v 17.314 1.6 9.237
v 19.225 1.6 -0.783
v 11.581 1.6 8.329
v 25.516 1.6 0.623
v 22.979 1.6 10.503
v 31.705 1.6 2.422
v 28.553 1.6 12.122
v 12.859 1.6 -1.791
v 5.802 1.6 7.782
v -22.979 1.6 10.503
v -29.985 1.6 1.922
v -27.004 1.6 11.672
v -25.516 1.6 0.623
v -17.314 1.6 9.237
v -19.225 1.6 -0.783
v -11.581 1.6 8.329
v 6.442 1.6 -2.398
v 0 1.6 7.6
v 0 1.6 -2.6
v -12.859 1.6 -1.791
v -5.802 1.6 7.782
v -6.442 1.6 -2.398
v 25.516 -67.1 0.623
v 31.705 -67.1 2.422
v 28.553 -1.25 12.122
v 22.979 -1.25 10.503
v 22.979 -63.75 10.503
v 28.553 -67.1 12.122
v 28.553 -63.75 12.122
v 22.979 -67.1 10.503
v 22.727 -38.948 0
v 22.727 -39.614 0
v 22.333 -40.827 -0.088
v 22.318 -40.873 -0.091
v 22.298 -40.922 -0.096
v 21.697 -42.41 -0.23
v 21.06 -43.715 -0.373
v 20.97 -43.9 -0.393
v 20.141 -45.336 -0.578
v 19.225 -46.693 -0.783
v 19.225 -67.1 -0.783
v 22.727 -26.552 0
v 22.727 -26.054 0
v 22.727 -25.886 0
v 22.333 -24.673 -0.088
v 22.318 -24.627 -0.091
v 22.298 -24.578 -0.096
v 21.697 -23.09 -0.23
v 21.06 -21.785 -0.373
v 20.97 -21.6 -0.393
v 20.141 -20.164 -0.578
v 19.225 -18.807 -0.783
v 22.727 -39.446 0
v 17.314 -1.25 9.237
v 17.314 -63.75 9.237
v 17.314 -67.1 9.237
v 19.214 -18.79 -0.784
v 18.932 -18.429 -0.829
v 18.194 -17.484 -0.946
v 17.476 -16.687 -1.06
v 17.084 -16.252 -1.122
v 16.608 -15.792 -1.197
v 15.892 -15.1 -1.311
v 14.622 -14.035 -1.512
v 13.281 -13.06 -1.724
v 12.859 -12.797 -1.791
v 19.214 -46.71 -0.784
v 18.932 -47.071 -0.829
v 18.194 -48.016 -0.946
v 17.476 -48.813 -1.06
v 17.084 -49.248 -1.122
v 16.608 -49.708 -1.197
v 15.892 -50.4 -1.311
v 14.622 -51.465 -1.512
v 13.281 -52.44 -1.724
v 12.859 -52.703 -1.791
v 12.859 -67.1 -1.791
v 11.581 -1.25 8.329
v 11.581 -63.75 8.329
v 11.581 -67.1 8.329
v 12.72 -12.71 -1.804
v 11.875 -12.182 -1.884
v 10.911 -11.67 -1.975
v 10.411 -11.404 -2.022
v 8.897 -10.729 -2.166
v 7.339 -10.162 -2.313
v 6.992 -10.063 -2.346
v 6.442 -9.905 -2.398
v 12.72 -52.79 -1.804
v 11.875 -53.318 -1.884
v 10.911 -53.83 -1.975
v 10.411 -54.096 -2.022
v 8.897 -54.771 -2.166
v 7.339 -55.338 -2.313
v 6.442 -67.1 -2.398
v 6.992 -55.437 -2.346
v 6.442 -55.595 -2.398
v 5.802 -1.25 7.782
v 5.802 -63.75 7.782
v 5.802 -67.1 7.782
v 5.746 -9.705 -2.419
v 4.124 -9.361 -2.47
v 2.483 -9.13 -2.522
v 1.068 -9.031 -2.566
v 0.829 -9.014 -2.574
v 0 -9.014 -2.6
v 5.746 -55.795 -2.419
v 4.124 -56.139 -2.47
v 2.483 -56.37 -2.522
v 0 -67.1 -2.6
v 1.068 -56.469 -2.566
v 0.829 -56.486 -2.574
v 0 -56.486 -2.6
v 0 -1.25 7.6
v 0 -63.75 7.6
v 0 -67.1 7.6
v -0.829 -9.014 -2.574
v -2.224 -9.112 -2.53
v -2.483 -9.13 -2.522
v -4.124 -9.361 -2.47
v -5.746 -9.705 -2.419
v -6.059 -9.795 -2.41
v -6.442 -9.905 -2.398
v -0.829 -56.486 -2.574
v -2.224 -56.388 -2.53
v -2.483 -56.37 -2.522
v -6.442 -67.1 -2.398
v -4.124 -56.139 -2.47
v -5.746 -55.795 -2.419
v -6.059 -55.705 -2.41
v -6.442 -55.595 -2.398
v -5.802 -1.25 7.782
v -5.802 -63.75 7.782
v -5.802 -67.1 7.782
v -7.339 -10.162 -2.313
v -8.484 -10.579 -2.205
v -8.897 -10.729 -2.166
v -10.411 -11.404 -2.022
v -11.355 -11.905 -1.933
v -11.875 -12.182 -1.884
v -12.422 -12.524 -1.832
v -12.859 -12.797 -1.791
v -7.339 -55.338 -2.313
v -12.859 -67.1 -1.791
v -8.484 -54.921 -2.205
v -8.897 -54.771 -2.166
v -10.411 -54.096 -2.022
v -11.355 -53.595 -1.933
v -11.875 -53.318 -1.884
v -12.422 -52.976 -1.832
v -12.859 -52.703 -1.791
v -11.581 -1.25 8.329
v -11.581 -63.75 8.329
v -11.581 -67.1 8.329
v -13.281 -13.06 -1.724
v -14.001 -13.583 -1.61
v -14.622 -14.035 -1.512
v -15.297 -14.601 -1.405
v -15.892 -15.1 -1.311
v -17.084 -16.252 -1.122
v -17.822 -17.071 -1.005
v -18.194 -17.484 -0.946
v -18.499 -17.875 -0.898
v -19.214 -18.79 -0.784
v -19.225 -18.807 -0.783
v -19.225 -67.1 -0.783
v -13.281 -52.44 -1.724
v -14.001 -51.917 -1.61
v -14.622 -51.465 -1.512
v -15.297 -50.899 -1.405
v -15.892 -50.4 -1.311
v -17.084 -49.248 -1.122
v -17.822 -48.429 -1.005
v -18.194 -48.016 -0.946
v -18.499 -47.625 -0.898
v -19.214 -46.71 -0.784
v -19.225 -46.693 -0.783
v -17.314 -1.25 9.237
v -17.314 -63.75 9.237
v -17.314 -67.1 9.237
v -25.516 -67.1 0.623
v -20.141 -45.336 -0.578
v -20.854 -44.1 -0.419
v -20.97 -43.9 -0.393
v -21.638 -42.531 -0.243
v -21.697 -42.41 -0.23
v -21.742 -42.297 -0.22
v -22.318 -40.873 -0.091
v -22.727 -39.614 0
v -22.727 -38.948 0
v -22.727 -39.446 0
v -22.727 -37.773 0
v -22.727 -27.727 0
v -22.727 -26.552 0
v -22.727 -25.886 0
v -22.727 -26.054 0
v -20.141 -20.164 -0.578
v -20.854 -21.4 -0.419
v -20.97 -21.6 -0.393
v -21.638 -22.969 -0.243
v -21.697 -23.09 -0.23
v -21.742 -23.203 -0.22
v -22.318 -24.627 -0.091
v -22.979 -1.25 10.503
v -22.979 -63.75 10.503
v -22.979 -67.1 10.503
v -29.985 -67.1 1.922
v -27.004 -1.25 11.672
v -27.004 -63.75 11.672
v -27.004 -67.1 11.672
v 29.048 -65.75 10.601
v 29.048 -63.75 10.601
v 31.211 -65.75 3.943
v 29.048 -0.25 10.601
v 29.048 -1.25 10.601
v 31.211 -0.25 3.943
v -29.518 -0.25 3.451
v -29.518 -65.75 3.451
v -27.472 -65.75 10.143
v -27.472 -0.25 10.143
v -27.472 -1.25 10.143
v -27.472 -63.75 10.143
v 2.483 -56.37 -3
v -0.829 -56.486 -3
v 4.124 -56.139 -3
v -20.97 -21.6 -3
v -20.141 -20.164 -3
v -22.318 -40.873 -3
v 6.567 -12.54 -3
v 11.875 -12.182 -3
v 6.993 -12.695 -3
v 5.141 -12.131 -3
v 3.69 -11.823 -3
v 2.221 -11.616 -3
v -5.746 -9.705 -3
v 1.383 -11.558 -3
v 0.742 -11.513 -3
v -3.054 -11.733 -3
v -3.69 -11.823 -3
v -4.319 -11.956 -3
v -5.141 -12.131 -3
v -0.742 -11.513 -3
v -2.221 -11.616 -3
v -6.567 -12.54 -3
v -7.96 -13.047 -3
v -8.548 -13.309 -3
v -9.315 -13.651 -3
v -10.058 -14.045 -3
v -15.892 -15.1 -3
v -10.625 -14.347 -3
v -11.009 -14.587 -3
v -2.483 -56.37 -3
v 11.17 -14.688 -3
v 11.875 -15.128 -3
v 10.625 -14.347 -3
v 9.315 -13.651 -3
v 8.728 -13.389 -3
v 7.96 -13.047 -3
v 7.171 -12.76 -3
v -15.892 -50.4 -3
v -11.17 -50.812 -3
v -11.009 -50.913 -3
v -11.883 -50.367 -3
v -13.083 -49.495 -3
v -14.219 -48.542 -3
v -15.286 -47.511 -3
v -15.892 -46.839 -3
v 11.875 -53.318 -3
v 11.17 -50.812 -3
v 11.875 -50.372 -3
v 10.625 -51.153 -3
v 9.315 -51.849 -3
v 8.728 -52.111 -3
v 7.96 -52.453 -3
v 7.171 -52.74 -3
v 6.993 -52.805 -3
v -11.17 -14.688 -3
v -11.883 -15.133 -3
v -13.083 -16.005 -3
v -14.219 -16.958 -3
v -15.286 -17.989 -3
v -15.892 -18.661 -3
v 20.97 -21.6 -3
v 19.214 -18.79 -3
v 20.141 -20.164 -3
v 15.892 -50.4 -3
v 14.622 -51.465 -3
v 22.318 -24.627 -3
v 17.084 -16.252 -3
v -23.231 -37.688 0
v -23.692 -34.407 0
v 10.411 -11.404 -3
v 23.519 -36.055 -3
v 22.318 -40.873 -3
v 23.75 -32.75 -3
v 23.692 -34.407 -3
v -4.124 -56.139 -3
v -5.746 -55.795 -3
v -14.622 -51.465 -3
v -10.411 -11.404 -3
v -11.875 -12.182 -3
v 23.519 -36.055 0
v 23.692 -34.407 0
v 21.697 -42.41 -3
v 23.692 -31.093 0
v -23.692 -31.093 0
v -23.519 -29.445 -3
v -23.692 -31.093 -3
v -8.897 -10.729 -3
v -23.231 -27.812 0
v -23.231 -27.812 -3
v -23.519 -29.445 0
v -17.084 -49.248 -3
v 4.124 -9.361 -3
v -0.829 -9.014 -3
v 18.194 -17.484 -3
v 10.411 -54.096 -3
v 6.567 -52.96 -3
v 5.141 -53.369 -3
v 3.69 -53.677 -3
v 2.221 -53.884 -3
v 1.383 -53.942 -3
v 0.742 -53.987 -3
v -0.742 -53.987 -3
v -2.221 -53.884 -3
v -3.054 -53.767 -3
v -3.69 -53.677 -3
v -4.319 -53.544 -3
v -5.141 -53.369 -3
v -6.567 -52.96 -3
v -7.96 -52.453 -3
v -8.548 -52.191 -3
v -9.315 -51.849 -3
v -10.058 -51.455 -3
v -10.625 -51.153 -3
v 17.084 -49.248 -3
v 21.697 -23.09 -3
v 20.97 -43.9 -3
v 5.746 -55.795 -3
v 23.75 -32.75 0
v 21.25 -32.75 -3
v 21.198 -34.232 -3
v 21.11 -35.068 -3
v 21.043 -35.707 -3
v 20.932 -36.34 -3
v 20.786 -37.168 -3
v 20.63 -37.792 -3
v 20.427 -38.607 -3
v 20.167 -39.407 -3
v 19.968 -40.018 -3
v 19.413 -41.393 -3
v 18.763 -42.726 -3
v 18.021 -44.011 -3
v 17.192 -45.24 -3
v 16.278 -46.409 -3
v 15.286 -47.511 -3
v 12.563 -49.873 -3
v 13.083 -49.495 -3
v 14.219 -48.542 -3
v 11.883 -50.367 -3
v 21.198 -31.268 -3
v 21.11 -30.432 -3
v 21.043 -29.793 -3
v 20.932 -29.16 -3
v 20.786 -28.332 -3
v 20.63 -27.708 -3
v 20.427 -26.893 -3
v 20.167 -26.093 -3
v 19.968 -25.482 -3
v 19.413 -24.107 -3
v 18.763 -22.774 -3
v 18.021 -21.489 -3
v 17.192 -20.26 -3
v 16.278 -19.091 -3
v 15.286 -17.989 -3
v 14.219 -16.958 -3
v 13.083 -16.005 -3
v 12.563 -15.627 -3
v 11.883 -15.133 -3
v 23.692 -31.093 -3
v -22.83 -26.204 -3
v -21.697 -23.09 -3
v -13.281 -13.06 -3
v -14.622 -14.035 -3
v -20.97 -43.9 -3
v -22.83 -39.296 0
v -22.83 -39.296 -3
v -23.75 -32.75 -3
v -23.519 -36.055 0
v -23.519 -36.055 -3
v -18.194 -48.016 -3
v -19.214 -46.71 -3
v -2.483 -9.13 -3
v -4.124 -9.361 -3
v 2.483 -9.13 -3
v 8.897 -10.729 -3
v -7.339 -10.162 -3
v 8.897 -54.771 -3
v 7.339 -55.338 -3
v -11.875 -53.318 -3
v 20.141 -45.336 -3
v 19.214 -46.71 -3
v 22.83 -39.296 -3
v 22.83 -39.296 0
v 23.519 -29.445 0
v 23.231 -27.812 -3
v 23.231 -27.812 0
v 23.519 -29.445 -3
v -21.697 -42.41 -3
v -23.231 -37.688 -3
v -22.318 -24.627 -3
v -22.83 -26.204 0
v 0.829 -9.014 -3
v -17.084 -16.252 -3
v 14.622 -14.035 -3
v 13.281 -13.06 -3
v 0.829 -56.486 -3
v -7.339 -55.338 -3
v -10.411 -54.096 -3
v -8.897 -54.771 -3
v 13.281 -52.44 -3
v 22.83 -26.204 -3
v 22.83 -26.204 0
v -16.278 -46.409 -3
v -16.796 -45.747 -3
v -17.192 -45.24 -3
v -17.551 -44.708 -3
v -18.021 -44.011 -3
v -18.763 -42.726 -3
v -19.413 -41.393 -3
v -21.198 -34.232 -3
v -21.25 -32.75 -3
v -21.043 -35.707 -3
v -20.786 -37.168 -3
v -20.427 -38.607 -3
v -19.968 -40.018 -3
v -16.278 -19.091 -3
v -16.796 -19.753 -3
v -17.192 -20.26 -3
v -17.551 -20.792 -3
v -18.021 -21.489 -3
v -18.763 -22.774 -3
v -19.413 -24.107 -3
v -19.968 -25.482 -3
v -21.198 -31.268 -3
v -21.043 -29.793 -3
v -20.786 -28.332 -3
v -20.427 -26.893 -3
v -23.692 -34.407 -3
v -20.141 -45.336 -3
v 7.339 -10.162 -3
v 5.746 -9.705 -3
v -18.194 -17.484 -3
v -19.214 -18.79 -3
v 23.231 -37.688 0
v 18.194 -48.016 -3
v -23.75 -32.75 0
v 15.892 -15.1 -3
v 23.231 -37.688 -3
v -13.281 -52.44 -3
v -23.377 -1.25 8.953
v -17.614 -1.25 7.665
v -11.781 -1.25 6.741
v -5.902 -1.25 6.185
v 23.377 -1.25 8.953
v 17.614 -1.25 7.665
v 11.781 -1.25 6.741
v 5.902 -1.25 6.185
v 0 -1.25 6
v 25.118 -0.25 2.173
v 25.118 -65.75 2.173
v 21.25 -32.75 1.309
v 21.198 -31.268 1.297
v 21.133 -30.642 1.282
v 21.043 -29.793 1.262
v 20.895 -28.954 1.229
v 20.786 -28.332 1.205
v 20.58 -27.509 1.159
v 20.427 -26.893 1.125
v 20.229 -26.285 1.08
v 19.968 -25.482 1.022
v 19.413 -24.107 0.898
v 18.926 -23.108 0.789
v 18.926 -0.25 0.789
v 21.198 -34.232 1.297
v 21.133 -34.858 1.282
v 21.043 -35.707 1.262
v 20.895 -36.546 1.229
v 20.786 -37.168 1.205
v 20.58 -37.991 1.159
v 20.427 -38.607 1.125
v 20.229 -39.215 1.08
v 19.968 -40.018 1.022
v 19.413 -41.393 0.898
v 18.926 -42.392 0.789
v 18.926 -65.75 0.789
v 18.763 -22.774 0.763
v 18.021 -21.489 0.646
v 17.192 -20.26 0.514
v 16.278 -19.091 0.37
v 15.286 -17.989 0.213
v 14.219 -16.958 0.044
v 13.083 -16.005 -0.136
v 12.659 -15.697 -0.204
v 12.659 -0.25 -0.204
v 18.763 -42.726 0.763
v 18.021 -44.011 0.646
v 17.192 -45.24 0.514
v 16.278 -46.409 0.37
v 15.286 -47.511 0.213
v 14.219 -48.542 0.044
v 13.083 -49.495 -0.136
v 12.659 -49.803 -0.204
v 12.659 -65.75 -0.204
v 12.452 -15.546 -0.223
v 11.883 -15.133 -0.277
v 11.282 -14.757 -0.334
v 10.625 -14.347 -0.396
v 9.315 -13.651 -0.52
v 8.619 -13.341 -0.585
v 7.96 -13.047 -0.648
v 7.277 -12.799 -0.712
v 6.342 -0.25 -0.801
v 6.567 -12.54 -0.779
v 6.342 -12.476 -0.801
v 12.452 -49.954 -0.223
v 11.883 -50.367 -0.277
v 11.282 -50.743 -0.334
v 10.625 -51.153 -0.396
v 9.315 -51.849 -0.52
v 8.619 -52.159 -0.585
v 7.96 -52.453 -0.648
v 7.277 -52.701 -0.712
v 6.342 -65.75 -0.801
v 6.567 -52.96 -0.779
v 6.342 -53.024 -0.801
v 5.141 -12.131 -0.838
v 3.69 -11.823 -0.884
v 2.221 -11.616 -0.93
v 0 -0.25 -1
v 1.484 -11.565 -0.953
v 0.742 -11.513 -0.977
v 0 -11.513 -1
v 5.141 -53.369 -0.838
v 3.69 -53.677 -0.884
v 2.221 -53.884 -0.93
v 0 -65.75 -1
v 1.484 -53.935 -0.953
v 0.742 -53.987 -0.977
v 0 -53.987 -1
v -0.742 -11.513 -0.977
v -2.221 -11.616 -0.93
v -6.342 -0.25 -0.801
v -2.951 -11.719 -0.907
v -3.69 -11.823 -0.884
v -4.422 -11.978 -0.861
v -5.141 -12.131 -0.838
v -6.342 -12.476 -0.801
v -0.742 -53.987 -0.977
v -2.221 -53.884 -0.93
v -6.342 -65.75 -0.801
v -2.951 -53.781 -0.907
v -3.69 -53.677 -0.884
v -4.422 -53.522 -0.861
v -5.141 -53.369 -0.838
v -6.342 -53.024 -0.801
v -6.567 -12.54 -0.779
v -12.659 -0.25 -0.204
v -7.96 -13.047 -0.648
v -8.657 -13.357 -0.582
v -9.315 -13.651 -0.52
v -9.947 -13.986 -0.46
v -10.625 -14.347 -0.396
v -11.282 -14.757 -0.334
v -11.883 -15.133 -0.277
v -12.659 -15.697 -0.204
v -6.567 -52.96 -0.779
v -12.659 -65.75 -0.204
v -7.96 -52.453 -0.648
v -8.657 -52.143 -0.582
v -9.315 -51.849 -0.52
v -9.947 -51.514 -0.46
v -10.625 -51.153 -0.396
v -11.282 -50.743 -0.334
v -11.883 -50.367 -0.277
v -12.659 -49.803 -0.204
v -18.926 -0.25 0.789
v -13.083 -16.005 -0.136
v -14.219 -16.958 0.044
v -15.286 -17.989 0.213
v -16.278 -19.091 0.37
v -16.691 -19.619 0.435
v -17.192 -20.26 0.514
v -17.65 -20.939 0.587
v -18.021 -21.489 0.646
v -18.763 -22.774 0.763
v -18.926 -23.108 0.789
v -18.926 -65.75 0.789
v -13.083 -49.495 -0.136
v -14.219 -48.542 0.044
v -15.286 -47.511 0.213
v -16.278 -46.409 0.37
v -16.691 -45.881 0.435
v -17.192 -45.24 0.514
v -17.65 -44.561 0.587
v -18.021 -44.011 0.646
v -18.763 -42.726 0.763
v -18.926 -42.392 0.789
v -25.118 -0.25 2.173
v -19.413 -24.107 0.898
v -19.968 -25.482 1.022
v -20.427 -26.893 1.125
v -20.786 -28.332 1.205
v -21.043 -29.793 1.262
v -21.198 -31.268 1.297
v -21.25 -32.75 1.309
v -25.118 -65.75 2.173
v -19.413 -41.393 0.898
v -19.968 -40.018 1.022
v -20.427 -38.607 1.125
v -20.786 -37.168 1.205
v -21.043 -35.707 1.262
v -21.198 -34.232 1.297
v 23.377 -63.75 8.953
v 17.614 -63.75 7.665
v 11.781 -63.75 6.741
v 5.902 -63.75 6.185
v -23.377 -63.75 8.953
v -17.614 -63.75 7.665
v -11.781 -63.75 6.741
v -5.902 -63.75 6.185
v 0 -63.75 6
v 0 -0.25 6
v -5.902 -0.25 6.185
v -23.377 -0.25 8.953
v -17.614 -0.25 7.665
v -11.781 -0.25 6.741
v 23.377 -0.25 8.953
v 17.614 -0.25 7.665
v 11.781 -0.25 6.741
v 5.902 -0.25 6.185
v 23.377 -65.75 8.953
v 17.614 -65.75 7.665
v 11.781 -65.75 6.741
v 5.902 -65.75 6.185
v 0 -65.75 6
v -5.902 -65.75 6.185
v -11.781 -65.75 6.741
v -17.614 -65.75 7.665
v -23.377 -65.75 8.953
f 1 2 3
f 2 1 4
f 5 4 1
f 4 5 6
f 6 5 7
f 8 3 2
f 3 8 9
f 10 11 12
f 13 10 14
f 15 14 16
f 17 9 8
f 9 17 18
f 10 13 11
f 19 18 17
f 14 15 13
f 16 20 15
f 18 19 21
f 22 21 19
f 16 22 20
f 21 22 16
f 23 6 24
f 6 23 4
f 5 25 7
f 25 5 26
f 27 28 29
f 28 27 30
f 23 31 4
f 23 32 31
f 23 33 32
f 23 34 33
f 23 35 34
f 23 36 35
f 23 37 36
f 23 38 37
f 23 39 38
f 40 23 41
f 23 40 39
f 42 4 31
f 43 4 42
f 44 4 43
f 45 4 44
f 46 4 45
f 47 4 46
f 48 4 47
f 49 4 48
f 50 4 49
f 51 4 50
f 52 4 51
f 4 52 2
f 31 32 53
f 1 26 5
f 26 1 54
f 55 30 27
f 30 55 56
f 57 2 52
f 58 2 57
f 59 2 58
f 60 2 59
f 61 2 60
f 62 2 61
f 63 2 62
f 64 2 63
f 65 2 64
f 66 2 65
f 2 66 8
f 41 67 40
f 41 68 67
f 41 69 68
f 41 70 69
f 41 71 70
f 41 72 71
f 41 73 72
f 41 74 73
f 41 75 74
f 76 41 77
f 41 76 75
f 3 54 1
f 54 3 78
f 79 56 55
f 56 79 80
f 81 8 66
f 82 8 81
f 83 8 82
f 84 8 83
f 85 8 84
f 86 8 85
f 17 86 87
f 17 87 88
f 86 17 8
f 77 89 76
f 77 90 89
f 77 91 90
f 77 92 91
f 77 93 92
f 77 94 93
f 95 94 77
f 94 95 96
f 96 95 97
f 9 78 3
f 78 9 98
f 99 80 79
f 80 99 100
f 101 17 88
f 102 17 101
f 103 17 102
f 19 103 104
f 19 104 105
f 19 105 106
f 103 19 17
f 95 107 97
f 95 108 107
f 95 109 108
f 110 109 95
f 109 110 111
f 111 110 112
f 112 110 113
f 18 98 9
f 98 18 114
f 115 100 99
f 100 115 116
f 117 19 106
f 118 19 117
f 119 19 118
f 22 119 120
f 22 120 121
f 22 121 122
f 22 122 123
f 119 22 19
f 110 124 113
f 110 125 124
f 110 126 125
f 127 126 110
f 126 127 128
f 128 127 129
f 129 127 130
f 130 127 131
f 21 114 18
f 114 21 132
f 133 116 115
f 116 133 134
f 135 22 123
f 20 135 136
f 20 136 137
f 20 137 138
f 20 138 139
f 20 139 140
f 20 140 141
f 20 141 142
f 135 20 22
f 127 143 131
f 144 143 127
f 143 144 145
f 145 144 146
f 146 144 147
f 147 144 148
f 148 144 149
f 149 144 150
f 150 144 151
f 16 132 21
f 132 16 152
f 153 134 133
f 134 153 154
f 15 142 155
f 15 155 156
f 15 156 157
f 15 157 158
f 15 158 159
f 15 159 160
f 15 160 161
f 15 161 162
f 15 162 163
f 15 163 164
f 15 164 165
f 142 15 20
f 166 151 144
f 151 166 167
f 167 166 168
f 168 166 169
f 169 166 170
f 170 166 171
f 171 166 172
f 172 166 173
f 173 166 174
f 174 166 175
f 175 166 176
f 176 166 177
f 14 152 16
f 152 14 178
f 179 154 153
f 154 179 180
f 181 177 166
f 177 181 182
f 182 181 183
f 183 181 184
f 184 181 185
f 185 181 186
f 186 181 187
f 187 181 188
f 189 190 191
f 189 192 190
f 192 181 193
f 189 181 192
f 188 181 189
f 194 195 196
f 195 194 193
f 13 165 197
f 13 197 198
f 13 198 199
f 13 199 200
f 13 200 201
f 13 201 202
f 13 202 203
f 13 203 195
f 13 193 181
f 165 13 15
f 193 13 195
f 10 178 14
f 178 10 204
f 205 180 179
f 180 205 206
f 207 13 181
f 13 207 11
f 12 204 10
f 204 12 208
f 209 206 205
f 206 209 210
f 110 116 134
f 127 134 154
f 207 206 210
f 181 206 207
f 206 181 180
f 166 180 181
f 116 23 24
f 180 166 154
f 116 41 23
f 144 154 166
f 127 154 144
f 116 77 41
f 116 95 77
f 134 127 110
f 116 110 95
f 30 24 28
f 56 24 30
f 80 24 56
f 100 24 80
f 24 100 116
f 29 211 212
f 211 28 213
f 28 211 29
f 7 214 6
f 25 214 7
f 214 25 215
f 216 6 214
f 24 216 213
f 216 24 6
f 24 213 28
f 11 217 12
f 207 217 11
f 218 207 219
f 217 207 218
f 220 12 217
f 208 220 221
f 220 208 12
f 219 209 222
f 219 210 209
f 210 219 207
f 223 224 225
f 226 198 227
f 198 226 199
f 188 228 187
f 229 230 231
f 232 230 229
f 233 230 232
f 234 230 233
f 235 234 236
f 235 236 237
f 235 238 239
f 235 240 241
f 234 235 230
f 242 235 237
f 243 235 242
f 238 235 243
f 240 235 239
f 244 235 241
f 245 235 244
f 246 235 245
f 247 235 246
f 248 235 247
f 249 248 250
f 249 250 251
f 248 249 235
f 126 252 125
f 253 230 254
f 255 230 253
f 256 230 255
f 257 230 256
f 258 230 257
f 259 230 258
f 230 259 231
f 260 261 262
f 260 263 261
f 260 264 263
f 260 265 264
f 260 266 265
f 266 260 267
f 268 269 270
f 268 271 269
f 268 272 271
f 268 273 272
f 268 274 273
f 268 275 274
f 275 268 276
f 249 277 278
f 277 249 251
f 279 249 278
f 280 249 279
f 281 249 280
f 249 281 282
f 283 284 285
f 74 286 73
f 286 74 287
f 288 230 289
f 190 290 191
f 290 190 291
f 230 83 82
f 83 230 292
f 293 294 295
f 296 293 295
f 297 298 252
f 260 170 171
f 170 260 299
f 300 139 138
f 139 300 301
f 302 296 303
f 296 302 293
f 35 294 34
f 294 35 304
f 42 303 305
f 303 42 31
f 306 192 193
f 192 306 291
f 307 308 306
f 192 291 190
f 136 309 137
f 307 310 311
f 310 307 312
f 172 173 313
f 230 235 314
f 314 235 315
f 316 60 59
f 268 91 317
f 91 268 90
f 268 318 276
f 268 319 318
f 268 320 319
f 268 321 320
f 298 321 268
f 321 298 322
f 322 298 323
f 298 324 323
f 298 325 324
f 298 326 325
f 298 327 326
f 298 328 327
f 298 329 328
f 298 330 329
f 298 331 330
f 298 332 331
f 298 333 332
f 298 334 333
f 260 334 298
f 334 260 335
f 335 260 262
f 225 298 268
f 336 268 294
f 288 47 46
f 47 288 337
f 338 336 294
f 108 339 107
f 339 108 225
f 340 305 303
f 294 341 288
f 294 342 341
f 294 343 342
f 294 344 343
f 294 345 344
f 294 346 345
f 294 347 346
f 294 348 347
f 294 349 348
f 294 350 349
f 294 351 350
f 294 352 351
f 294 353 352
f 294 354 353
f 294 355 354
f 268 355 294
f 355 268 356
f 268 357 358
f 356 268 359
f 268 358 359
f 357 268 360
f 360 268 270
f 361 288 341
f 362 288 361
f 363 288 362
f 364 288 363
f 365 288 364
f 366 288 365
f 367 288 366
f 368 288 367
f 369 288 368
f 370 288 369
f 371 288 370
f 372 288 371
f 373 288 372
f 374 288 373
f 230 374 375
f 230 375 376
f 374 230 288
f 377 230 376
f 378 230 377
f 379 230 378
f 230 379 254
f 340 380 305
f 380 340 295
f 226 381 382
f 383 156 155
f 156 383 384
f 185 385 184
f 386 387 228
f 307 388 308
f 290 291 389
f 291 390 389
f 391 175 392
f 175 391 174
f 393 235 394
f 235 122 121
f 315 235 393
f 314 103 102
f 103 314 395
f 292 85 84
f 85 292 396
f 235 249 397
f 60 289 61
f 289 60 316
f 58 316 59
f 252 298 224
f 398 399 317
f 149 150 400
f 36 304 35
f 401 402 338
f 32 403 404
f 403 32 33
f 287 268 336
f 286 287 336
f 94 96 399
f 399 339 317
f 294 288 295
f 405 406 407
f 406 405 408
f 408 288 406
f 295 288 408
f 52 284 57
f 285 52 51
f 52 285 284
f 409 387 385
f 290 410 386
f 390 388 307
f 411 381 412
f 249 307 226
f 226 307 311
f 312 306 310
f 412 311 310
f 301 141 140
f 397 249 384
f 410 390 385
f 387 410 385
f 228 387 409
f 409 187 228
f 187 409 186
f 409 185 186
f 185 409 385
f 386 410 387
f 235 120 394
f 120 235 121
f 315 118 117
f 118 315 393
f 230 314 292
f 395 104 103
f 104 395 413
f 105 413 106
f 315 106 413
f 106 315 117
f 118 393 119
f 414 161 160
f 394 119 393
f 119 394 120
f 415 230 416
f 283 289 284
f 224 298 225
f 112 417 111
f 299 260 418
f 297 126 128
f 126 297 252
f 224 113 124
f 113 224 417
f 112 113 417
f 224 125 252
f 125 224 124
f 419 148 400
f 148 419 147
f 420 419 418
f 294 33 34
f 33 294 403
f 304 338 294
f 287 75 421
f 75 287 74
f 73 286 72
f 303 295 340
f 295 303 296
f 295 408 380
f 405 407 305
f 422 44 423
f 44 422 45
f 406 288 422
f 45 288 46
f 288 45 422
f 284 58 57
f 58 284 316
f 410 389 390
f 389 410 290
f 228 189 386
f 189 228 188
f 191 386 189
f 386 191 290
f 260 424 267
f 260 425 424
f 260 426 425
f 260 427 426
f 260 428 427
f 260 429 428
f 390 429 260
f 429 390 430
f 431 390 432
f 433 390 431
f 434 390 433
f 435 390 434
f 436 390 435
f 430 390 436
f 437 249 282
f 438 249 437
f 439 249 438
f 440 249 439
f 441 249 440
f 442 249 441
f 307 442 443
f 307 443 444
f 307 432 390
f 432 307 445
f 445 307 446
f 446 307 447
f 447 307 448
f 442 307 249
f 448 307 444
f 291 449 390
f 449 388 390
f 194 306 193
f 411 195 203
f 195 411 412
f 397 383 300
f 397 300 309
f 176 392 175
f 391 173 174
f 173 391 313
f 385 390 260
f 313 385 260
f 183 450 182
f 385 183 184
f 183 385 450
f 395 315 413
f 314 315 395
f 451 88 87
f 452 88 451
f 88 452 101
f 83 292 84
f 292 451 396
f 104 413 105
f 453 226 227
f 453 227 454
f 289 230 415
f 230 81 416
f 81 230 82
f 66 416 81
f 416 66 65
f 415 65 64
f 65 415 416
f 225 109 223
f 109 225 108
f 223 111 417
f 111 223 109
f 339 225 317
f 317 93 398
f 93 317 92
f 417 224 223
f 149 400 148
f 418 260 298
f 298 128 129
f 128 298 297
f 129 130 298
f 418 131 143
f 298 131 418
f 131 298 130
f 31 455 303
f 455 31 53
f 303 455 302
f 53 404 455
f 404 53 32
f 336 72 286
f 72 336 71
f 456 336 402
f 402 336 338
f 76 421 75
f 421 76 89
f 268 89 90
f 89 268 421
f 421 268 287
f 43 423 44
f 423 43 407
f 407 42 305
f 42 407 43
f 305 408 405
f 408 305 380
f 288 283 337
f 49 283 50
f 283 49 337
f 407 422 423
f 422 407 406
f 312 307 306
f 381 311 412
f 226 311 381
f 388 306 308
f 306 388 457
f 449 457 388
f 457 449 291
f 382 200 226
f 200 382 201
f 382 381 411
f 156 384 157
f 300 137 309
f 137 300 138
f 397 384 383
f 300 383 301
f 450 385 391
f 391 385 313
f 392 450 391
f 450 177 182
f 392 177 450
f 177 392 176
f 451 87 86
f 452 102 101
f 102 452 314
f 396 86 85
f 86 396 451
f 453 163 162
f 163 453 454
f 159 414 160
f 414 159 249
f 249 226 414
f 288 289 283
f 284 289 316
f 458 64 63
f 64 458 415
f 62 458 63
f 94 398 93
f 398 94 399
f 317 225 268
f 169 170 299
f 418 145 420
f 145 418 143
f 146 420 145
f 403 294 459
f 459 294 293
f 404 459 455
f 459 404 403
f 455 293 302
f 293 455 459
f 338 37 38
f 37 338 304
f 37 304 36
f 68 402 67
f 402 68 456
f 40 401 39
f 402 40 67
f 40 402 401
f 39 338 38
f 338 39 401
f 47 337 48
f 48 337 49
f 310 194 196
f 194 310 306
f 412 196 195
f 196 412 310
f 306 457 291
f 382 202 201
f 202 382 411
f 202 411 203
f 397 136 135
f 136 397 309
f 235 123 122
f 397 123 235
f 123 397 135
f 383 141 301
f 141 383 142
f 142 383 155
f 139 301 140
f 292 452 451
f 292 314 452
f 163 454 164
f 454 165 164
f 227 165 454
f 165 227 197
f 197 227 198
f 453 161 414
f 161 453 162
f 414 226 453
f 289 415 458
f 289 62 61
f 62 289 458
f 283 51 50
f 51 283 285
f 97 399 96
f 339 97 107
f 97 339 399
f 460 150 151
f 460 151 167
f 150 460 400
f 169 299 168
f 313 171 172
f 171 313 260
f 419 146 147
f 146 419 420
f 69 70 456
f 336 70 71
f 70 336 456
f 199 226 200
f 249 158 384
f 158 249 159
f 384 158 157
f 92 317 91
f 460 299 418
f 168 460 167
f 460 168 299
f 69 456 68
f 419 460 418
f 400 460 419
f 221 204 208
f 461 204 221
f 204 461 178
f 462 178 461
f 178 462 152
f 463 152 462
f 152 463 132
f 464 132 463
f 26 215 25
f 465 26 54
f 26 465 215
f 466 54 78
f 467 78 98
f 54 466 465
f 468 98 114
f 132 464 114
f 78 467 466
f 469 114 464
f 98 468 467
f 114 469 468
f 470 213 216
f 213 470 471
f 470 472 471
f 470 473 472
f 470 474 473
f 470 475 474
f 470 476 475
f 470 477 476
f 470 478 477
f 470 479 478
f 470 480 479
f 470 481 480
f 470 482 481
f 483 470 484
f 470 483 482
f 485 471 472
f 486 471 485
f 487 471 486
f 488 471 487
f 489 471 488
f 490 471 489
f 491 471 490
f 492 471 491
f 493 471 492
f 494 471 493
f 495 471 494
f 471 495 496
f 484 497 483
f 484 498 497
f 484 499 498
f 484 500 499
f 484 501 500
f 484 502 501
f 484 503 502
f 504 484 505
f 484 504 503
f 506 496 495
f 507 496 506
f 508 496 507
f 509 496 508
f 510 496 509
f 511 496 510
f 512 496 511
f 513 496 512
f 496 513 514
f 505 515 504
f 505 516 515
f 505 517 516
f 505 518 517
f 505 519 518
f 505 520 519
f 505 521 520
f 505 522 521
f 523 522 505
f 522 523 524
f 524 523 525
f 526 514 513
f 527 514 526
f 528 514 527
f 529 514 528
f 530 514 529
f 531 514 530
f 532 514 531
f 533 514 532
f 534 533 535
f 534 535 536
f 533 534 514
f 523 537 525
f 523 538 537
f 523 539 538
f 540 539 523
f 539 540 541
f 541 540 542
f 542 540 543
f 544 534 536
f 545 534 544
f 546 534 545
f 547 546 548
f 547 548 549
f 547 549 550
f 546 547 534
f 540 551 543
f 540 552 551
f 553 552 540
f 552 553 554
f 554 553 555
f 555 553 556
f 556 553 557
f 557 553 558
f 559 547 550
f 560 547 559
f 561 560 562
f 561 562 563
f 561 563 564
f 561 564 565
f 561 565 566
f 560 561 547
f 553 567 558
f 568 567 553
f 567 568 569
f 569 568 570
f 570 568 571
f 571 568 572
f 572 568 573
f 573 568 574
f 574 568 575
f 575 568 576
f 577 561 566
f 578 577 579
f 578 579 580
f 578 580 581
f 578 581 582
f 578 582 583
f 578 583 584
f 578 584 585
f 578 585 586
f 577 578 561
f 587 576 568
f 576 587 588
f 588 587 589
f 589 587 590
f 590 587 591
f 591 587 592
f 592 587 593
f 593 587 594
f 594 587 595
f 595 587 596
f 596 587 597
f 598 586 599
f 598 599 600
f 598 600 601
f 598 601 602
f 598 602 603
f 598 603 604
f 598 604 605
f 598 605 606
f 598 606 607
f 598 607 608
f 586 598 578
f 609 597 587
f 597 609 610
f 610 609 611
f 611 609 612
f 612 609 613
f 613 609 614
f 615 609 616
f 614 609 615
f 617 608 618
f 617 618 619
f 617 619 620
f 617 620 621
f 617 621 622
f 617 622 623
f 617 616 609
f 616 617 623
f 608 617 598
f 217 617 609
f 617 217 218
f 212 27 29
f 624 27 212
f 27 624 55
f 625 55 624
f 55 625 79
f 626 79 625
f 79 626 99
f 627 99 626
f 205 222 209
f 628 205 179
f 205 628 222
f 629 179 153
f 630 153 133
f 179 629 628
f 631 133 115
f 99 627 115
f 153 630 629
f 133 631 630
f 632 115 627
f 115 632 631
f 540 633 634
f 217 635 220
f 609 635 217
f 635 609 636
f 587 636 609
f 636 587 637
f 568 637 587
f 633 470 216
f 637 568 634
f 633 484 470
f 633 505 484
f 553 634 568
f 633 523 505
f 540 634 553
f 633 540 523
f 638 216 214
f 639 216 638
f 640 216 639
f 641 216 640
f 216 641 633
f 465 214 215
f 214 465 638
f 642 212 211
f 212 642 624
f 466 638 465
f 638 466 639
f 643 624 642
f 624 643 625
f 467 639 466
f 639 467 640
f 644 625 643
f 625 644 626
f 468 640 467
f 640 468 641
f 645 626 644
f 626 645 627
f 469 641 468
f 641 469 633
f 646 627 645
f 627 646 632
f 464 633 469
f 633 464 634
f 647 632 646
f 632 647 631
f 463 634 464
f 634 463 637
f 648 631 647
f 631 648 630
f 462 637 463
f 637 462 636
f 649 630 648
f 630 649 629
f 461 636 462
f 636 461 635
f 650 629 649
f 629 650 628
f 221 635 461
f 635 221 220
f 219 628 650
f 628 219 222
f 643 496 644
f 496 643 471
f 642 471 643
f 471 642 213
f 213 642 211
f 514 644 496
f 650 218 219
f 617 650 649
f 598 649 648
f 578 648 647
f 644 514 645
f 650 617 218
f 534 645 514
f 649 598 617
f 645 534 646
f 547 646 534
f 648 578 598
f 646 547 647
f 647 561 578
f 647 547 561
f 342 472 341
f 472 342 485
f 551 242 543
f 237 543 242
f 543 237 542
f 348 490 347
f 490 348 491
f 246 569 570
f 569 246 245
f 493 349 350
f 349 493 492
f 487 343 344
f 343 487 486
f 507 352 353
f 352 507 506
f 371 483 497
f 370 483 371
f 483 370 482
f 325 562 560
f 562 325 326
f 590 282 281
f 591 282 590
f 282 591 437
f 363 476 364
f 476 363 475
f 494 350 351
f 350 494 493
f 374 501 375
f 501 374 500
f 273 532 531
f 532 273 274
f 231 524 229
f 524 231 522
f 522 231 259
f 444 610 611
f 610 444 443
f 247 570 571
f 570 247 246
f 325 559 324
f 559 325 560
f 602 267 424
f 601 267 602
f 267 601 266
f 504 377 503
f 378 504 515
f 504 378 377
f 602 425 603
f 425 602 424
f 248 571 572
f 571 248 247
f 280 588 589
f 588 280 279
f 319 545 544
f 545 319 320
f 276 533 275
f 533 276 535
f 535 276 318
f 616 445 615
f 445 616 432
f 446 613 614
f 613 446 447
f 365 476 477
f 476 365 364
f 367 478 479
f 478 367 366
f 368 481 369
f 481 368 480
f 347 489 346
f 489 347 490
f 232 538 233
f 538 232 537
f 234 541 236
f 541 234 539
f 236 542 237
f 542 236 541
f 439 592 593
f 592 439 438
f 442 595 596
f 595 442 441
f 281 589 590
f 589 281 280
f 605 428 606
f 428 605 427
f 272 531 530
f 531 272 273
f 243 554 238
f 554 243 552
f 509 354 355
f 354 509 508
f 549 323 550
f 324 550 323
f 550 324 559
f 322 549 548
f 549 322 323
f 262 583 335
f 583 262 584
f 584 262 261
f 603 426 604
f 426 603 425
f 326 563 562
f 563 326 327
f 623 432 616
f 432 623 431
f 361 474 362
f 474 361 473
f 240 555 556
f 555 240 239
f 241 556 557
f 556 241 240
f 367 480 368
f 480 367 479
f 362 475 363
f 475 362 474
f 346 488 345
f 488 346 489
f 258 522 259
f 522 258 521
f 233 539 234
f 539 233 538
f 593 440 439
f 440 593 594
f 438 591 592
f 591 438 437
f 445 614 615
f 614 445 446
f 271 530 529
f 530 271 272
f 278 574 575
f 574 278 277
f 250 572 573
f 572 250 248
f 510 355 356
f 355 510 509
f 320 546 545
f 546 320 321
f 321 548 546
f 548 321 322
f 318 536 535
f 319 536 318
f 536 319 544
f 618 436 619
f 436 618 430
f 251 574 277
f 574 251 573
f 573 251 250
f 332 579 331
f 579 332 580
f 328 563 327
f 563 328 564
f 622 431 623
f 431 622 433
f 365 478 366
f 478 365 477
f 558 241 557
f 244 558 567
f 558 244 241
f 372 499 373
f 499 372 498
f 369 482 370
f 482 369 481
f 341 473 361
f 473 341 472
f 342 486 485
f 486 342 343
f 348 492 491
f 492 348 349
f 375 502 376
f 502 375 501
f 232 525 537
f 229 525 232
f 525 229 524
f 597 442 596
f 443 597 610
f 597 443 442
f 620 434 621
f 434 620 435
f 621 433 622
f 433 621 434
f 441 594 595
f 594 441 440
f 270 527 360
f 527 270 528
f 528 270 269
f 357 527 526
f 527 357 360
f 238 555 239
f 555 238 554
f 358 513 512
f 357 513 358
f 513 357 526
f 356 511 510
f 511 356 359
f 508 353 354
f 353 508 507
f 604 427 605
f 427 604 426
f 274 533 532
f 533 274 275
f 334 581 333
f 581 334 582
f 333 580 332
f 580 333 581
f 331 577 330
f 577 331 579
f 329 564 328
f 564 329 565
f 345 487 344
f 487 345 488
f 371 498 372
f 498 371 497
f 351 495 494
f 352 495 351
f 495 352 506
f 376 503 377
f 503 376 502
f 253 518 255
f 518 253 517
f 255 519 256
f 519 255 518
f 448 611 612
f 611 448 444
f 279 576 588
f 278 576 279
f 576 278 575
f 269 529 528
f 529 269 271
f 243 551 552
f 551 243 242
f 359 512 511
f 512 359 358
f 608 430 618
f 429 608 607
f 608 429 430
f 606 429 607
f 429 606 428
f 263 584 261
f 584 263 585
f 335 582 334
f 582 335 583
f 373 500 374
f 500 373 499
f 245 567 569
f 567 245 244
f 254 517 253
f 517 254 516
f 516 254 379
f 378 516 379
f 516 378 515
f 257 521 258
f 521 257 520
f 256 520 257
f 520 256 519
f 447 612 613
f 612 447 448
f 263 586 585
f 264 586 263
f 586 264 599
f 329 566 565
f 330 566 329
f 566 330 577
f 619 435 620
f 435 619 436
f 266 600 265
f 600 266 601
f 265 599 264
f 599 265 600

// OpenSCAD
/*----------------------------------------------------------------------------
 * Customisable holder for a hygrometer bought from eBay.
 * Created by FeNi64
 * Version 2.0, 2018-05-10
 * Inspired by https://www.thingiverse.com/thing:2429114
 *
 * This program is free software; you can redistribute it and/or modify
 * it under the terms of the GNU General Public License as published by
 * the Free Software Foundation; either version 3 of the License,
 * LGPL version 2.1, or (at your option) any later version of the GPL.
 *
 * This program is distributed in the hope that it will be useful,
 * but WITHOUT ANY WARRANTY; without even the implied warranty of
 * MERCHANTABILITY or FITNESS FOR A PARTICULAR PURPOSE. See the
 * GNU General Public License for more details.
 *
 * You should have received a copy of the GNU General Public License
 * along with this program; if not, write to the Free Software
 * Foundation, Inc., 59 Temple Place, Suite 330, Boston, MA 02111-1307 USA
 *
 *		2018. License, GPL v2 or later
 *----------------------------------------------------------------------------*/

// Mount a hygrometer into the hole for a filament spool

// Styles: 1: A cylinder into the smaller spool_d (Cocoon spools)
//         2: A cylinder into the larger spool_d, with cutouts for the spokes between that and the smaller spool_d (Cocoon spool have this)
//	   3: A flat front for the hygrometer to fit inside the larger spool_d (e.g. MasterSpool)
//	   4: Spans the spool edge, with a flat front (so the spools can stack sideways and it won't extend outside of spool).
style=4;  // [1:Pipes for meter and spool,  2: Spoke-style into spool hole, 3: Front-panel (meter fits into spool hole) 4: Edge-mounted]

// Depth into the spool 
spool_h=10;
// Inside diameter of spool hole (Cocoon: 32, MasterSpool: 52.5)
spool_d=32;// [32-99]
// Inside width of spool hole, for edge-mount style
spool_wi=46;  // [32-99]
// Outside width of spool, for edge-mount style. There's a 1mm grip on each outside, grip_h tall.
spool_wo=65.5; // [32-99]
// Diameter of spool, so we can get the right roundness.
spool3_d=202;  // [150-250]
// Height of the 'edge' on the spool, so we can grip around it.
grip_h=7;

// Meter body outside diameter
meter_d=42.5;
// Height of meter body
meter_h=15.0;
// The meter has grips which turn inward 4mm from the inside front edge.
meter2_h=4;

// Everything is this thick
thickness=1.6; // [0.5-3.0]

/* [Hidden] */
// Angle of the holes on the spoke-style mount.
armangle=45; // There are eight spokes
$fn=90;

if (style == 1) {

	// Cylinder into the 32mm spool
	difference() {
		cylinder(h=spool_h+1,d=spool_d);
		translate([0,0,-1])cylinder(h=spool_h+3,d=spool_d-thickness*2);
	}

	// The interface between the two.
	translate([0,0,spool_h]) difference() {
		cylinder(h=1,d=max(spool_d,meter_d));
		translate([0,0,-1]) cylinder(h=3,d=min(spool_d-thickness*2,meter_d+thickness*2));
	}

	// Where the meter fits.
	translate([0,0,spool_h]) difference() {
		cylinder(h=meter_h,d=meter_d+thickness*2);
		translate([0,0,-1])cylinder(h=meter_h+2,d=meter_d);
	}
} else if (style == 2) {

	// A 'claw' into the larger spool, to fit both MasterSpool and the other spools.
	difference() {
		cylinder(h=spool_h+1,d=spool_d);
		translate([0,0,-1])cylinder(h=spool_h+3,d=spool_d-thickness*2);

		// Minus some holes for the spool spokes
		for(a=[0:armangle:360]) {
			rotate([0,0,a]) translate([0,-(spool_d+1)/2,-1]) {
				translate([-0.2,0,0])cube([2,spool_d+1,spool_h+1]);
			}
		}

	}



	// The interface between the two.
	translate([0,0,spool_h]) difference() {
		cylinder(h=1,d=max(spool_d,meter_d));
		translate([0,0,-1]) cylinder(h=3,d=min(spool_d-thickness*2,meter_d+thickness*2));
	}

	// Where the meter fits.
	translate([0,0,spool_h]) difference() {
		cylinder(h=meter_h,d=meter_d+thickness*2);
		translate([0,0,-1])cylinder(h=meter_h+2,d=meter_d);
	}
} else if (style == 3) {
	// A flat front into the 52.5mm spool
	// (52.5mm + 4mm front piece, meter_d hole in a 52.5mm (OD) cylinder.
	if (spool_d < meter_d) {
		echo ("Cannot fit meter into spool hole");
	} else {
		difference() {
			union() {
				cylinder(h=1,d=spool_d+4);
				cylinder(h=meter2_h,d=spool_d);
			}
			translate([0,0,-1]) cylinder(h=spool_h+2,d=meter_d);
		}
	}
} else if (style == 4) {
	// Show spool, during development (remove the 'translate and rotate' from the part below)
	if (0 == 1) {
		%union() {
			difference() {
				cylinder(h=spool_wo,d=spool3_d);
				translate([0,0,(spool_wo-spool_wi)/2]) cylinder(h=spool_wi,d=spool3_d+1);

				translate([0,0,-0.1]) cylinder(h=1,d=spool3_d - grip_h);
				translate([0,0,spool_wo-1+0.1]) cylinder(h=1,d=spool3_d - grip_h);
			}
			cylinder(h=spool_wo,d=spool_d);
		}
	}

	translate([0,0,100])rotate([90,-18,0]) {
		difference() {
			union() {
				// The main body
				translate([0,0,-thickness])arc(2*thickness + grip_h,spool_wo+2*thickness,spool3_d/2 + thickness,35);
				// A front panel for the meter.
				rotate([90,0,-18]) translate([0,(spool_wo)/2,spool3_d/2-meter_h/2+6.5])cylinder(h=3,d=meter_d+5);
			}

			// Room for the spool
			translate([0,0,(spool_wo-spool_wi-5)/2-6]) arc(2*thickness + grip_h,spool_wo-3,spool3_d/2 ,36);

			// Minus a gap around the spool edge
			translate([0,0,(spool_wo-spool_wi)/2-9.5]) arc(grip_h,spool_wo,spool3_d/2,meter_d+0);

			// Minus a hole for the meter.
			// Should replace '18 degrees' with some calculation on the arc size
			rotate([90,0,-18]) translate([0,(spool_wo)/2,spool3_d/2-meter_h/1])cylinder(h=2*meter_h,d=meter_d);
		}
	}

}

/* module arc()
 * Excerpt from... 
 * 
 * Parametric Encoder Wheel 
 *
 * by Alex Franke (codecreations), March 2012
 * http://www.theFrankes.com
 * 
 * Licenced under Creative Commons Attribution - Non-Commercial - Share Alike 3.0 
 */

module arc( height, depth, radius, degrees ) {
	// This dies a horible death if it's not rendered here 
	// -- sucks up all memory and spins out of control 
	render() {
		difference() {
			// Outer ring
			rotate_extrude($fn = 100)
				translate([radius - height, 0, 0])
				square([height,depth]);

			// Cut half off
			translate([0,-(radius+1),-.5]) 
				cube ([radius+1,(radius+1)*2,depth+1]);

			// Cover the other half as necessary
			rotate([0,0,180-degrees])
				translate([0,-(radius+1),-.5]) 
				cube ([radius+1,(radius+1)*2,depth+1]);

		}
	}
}
